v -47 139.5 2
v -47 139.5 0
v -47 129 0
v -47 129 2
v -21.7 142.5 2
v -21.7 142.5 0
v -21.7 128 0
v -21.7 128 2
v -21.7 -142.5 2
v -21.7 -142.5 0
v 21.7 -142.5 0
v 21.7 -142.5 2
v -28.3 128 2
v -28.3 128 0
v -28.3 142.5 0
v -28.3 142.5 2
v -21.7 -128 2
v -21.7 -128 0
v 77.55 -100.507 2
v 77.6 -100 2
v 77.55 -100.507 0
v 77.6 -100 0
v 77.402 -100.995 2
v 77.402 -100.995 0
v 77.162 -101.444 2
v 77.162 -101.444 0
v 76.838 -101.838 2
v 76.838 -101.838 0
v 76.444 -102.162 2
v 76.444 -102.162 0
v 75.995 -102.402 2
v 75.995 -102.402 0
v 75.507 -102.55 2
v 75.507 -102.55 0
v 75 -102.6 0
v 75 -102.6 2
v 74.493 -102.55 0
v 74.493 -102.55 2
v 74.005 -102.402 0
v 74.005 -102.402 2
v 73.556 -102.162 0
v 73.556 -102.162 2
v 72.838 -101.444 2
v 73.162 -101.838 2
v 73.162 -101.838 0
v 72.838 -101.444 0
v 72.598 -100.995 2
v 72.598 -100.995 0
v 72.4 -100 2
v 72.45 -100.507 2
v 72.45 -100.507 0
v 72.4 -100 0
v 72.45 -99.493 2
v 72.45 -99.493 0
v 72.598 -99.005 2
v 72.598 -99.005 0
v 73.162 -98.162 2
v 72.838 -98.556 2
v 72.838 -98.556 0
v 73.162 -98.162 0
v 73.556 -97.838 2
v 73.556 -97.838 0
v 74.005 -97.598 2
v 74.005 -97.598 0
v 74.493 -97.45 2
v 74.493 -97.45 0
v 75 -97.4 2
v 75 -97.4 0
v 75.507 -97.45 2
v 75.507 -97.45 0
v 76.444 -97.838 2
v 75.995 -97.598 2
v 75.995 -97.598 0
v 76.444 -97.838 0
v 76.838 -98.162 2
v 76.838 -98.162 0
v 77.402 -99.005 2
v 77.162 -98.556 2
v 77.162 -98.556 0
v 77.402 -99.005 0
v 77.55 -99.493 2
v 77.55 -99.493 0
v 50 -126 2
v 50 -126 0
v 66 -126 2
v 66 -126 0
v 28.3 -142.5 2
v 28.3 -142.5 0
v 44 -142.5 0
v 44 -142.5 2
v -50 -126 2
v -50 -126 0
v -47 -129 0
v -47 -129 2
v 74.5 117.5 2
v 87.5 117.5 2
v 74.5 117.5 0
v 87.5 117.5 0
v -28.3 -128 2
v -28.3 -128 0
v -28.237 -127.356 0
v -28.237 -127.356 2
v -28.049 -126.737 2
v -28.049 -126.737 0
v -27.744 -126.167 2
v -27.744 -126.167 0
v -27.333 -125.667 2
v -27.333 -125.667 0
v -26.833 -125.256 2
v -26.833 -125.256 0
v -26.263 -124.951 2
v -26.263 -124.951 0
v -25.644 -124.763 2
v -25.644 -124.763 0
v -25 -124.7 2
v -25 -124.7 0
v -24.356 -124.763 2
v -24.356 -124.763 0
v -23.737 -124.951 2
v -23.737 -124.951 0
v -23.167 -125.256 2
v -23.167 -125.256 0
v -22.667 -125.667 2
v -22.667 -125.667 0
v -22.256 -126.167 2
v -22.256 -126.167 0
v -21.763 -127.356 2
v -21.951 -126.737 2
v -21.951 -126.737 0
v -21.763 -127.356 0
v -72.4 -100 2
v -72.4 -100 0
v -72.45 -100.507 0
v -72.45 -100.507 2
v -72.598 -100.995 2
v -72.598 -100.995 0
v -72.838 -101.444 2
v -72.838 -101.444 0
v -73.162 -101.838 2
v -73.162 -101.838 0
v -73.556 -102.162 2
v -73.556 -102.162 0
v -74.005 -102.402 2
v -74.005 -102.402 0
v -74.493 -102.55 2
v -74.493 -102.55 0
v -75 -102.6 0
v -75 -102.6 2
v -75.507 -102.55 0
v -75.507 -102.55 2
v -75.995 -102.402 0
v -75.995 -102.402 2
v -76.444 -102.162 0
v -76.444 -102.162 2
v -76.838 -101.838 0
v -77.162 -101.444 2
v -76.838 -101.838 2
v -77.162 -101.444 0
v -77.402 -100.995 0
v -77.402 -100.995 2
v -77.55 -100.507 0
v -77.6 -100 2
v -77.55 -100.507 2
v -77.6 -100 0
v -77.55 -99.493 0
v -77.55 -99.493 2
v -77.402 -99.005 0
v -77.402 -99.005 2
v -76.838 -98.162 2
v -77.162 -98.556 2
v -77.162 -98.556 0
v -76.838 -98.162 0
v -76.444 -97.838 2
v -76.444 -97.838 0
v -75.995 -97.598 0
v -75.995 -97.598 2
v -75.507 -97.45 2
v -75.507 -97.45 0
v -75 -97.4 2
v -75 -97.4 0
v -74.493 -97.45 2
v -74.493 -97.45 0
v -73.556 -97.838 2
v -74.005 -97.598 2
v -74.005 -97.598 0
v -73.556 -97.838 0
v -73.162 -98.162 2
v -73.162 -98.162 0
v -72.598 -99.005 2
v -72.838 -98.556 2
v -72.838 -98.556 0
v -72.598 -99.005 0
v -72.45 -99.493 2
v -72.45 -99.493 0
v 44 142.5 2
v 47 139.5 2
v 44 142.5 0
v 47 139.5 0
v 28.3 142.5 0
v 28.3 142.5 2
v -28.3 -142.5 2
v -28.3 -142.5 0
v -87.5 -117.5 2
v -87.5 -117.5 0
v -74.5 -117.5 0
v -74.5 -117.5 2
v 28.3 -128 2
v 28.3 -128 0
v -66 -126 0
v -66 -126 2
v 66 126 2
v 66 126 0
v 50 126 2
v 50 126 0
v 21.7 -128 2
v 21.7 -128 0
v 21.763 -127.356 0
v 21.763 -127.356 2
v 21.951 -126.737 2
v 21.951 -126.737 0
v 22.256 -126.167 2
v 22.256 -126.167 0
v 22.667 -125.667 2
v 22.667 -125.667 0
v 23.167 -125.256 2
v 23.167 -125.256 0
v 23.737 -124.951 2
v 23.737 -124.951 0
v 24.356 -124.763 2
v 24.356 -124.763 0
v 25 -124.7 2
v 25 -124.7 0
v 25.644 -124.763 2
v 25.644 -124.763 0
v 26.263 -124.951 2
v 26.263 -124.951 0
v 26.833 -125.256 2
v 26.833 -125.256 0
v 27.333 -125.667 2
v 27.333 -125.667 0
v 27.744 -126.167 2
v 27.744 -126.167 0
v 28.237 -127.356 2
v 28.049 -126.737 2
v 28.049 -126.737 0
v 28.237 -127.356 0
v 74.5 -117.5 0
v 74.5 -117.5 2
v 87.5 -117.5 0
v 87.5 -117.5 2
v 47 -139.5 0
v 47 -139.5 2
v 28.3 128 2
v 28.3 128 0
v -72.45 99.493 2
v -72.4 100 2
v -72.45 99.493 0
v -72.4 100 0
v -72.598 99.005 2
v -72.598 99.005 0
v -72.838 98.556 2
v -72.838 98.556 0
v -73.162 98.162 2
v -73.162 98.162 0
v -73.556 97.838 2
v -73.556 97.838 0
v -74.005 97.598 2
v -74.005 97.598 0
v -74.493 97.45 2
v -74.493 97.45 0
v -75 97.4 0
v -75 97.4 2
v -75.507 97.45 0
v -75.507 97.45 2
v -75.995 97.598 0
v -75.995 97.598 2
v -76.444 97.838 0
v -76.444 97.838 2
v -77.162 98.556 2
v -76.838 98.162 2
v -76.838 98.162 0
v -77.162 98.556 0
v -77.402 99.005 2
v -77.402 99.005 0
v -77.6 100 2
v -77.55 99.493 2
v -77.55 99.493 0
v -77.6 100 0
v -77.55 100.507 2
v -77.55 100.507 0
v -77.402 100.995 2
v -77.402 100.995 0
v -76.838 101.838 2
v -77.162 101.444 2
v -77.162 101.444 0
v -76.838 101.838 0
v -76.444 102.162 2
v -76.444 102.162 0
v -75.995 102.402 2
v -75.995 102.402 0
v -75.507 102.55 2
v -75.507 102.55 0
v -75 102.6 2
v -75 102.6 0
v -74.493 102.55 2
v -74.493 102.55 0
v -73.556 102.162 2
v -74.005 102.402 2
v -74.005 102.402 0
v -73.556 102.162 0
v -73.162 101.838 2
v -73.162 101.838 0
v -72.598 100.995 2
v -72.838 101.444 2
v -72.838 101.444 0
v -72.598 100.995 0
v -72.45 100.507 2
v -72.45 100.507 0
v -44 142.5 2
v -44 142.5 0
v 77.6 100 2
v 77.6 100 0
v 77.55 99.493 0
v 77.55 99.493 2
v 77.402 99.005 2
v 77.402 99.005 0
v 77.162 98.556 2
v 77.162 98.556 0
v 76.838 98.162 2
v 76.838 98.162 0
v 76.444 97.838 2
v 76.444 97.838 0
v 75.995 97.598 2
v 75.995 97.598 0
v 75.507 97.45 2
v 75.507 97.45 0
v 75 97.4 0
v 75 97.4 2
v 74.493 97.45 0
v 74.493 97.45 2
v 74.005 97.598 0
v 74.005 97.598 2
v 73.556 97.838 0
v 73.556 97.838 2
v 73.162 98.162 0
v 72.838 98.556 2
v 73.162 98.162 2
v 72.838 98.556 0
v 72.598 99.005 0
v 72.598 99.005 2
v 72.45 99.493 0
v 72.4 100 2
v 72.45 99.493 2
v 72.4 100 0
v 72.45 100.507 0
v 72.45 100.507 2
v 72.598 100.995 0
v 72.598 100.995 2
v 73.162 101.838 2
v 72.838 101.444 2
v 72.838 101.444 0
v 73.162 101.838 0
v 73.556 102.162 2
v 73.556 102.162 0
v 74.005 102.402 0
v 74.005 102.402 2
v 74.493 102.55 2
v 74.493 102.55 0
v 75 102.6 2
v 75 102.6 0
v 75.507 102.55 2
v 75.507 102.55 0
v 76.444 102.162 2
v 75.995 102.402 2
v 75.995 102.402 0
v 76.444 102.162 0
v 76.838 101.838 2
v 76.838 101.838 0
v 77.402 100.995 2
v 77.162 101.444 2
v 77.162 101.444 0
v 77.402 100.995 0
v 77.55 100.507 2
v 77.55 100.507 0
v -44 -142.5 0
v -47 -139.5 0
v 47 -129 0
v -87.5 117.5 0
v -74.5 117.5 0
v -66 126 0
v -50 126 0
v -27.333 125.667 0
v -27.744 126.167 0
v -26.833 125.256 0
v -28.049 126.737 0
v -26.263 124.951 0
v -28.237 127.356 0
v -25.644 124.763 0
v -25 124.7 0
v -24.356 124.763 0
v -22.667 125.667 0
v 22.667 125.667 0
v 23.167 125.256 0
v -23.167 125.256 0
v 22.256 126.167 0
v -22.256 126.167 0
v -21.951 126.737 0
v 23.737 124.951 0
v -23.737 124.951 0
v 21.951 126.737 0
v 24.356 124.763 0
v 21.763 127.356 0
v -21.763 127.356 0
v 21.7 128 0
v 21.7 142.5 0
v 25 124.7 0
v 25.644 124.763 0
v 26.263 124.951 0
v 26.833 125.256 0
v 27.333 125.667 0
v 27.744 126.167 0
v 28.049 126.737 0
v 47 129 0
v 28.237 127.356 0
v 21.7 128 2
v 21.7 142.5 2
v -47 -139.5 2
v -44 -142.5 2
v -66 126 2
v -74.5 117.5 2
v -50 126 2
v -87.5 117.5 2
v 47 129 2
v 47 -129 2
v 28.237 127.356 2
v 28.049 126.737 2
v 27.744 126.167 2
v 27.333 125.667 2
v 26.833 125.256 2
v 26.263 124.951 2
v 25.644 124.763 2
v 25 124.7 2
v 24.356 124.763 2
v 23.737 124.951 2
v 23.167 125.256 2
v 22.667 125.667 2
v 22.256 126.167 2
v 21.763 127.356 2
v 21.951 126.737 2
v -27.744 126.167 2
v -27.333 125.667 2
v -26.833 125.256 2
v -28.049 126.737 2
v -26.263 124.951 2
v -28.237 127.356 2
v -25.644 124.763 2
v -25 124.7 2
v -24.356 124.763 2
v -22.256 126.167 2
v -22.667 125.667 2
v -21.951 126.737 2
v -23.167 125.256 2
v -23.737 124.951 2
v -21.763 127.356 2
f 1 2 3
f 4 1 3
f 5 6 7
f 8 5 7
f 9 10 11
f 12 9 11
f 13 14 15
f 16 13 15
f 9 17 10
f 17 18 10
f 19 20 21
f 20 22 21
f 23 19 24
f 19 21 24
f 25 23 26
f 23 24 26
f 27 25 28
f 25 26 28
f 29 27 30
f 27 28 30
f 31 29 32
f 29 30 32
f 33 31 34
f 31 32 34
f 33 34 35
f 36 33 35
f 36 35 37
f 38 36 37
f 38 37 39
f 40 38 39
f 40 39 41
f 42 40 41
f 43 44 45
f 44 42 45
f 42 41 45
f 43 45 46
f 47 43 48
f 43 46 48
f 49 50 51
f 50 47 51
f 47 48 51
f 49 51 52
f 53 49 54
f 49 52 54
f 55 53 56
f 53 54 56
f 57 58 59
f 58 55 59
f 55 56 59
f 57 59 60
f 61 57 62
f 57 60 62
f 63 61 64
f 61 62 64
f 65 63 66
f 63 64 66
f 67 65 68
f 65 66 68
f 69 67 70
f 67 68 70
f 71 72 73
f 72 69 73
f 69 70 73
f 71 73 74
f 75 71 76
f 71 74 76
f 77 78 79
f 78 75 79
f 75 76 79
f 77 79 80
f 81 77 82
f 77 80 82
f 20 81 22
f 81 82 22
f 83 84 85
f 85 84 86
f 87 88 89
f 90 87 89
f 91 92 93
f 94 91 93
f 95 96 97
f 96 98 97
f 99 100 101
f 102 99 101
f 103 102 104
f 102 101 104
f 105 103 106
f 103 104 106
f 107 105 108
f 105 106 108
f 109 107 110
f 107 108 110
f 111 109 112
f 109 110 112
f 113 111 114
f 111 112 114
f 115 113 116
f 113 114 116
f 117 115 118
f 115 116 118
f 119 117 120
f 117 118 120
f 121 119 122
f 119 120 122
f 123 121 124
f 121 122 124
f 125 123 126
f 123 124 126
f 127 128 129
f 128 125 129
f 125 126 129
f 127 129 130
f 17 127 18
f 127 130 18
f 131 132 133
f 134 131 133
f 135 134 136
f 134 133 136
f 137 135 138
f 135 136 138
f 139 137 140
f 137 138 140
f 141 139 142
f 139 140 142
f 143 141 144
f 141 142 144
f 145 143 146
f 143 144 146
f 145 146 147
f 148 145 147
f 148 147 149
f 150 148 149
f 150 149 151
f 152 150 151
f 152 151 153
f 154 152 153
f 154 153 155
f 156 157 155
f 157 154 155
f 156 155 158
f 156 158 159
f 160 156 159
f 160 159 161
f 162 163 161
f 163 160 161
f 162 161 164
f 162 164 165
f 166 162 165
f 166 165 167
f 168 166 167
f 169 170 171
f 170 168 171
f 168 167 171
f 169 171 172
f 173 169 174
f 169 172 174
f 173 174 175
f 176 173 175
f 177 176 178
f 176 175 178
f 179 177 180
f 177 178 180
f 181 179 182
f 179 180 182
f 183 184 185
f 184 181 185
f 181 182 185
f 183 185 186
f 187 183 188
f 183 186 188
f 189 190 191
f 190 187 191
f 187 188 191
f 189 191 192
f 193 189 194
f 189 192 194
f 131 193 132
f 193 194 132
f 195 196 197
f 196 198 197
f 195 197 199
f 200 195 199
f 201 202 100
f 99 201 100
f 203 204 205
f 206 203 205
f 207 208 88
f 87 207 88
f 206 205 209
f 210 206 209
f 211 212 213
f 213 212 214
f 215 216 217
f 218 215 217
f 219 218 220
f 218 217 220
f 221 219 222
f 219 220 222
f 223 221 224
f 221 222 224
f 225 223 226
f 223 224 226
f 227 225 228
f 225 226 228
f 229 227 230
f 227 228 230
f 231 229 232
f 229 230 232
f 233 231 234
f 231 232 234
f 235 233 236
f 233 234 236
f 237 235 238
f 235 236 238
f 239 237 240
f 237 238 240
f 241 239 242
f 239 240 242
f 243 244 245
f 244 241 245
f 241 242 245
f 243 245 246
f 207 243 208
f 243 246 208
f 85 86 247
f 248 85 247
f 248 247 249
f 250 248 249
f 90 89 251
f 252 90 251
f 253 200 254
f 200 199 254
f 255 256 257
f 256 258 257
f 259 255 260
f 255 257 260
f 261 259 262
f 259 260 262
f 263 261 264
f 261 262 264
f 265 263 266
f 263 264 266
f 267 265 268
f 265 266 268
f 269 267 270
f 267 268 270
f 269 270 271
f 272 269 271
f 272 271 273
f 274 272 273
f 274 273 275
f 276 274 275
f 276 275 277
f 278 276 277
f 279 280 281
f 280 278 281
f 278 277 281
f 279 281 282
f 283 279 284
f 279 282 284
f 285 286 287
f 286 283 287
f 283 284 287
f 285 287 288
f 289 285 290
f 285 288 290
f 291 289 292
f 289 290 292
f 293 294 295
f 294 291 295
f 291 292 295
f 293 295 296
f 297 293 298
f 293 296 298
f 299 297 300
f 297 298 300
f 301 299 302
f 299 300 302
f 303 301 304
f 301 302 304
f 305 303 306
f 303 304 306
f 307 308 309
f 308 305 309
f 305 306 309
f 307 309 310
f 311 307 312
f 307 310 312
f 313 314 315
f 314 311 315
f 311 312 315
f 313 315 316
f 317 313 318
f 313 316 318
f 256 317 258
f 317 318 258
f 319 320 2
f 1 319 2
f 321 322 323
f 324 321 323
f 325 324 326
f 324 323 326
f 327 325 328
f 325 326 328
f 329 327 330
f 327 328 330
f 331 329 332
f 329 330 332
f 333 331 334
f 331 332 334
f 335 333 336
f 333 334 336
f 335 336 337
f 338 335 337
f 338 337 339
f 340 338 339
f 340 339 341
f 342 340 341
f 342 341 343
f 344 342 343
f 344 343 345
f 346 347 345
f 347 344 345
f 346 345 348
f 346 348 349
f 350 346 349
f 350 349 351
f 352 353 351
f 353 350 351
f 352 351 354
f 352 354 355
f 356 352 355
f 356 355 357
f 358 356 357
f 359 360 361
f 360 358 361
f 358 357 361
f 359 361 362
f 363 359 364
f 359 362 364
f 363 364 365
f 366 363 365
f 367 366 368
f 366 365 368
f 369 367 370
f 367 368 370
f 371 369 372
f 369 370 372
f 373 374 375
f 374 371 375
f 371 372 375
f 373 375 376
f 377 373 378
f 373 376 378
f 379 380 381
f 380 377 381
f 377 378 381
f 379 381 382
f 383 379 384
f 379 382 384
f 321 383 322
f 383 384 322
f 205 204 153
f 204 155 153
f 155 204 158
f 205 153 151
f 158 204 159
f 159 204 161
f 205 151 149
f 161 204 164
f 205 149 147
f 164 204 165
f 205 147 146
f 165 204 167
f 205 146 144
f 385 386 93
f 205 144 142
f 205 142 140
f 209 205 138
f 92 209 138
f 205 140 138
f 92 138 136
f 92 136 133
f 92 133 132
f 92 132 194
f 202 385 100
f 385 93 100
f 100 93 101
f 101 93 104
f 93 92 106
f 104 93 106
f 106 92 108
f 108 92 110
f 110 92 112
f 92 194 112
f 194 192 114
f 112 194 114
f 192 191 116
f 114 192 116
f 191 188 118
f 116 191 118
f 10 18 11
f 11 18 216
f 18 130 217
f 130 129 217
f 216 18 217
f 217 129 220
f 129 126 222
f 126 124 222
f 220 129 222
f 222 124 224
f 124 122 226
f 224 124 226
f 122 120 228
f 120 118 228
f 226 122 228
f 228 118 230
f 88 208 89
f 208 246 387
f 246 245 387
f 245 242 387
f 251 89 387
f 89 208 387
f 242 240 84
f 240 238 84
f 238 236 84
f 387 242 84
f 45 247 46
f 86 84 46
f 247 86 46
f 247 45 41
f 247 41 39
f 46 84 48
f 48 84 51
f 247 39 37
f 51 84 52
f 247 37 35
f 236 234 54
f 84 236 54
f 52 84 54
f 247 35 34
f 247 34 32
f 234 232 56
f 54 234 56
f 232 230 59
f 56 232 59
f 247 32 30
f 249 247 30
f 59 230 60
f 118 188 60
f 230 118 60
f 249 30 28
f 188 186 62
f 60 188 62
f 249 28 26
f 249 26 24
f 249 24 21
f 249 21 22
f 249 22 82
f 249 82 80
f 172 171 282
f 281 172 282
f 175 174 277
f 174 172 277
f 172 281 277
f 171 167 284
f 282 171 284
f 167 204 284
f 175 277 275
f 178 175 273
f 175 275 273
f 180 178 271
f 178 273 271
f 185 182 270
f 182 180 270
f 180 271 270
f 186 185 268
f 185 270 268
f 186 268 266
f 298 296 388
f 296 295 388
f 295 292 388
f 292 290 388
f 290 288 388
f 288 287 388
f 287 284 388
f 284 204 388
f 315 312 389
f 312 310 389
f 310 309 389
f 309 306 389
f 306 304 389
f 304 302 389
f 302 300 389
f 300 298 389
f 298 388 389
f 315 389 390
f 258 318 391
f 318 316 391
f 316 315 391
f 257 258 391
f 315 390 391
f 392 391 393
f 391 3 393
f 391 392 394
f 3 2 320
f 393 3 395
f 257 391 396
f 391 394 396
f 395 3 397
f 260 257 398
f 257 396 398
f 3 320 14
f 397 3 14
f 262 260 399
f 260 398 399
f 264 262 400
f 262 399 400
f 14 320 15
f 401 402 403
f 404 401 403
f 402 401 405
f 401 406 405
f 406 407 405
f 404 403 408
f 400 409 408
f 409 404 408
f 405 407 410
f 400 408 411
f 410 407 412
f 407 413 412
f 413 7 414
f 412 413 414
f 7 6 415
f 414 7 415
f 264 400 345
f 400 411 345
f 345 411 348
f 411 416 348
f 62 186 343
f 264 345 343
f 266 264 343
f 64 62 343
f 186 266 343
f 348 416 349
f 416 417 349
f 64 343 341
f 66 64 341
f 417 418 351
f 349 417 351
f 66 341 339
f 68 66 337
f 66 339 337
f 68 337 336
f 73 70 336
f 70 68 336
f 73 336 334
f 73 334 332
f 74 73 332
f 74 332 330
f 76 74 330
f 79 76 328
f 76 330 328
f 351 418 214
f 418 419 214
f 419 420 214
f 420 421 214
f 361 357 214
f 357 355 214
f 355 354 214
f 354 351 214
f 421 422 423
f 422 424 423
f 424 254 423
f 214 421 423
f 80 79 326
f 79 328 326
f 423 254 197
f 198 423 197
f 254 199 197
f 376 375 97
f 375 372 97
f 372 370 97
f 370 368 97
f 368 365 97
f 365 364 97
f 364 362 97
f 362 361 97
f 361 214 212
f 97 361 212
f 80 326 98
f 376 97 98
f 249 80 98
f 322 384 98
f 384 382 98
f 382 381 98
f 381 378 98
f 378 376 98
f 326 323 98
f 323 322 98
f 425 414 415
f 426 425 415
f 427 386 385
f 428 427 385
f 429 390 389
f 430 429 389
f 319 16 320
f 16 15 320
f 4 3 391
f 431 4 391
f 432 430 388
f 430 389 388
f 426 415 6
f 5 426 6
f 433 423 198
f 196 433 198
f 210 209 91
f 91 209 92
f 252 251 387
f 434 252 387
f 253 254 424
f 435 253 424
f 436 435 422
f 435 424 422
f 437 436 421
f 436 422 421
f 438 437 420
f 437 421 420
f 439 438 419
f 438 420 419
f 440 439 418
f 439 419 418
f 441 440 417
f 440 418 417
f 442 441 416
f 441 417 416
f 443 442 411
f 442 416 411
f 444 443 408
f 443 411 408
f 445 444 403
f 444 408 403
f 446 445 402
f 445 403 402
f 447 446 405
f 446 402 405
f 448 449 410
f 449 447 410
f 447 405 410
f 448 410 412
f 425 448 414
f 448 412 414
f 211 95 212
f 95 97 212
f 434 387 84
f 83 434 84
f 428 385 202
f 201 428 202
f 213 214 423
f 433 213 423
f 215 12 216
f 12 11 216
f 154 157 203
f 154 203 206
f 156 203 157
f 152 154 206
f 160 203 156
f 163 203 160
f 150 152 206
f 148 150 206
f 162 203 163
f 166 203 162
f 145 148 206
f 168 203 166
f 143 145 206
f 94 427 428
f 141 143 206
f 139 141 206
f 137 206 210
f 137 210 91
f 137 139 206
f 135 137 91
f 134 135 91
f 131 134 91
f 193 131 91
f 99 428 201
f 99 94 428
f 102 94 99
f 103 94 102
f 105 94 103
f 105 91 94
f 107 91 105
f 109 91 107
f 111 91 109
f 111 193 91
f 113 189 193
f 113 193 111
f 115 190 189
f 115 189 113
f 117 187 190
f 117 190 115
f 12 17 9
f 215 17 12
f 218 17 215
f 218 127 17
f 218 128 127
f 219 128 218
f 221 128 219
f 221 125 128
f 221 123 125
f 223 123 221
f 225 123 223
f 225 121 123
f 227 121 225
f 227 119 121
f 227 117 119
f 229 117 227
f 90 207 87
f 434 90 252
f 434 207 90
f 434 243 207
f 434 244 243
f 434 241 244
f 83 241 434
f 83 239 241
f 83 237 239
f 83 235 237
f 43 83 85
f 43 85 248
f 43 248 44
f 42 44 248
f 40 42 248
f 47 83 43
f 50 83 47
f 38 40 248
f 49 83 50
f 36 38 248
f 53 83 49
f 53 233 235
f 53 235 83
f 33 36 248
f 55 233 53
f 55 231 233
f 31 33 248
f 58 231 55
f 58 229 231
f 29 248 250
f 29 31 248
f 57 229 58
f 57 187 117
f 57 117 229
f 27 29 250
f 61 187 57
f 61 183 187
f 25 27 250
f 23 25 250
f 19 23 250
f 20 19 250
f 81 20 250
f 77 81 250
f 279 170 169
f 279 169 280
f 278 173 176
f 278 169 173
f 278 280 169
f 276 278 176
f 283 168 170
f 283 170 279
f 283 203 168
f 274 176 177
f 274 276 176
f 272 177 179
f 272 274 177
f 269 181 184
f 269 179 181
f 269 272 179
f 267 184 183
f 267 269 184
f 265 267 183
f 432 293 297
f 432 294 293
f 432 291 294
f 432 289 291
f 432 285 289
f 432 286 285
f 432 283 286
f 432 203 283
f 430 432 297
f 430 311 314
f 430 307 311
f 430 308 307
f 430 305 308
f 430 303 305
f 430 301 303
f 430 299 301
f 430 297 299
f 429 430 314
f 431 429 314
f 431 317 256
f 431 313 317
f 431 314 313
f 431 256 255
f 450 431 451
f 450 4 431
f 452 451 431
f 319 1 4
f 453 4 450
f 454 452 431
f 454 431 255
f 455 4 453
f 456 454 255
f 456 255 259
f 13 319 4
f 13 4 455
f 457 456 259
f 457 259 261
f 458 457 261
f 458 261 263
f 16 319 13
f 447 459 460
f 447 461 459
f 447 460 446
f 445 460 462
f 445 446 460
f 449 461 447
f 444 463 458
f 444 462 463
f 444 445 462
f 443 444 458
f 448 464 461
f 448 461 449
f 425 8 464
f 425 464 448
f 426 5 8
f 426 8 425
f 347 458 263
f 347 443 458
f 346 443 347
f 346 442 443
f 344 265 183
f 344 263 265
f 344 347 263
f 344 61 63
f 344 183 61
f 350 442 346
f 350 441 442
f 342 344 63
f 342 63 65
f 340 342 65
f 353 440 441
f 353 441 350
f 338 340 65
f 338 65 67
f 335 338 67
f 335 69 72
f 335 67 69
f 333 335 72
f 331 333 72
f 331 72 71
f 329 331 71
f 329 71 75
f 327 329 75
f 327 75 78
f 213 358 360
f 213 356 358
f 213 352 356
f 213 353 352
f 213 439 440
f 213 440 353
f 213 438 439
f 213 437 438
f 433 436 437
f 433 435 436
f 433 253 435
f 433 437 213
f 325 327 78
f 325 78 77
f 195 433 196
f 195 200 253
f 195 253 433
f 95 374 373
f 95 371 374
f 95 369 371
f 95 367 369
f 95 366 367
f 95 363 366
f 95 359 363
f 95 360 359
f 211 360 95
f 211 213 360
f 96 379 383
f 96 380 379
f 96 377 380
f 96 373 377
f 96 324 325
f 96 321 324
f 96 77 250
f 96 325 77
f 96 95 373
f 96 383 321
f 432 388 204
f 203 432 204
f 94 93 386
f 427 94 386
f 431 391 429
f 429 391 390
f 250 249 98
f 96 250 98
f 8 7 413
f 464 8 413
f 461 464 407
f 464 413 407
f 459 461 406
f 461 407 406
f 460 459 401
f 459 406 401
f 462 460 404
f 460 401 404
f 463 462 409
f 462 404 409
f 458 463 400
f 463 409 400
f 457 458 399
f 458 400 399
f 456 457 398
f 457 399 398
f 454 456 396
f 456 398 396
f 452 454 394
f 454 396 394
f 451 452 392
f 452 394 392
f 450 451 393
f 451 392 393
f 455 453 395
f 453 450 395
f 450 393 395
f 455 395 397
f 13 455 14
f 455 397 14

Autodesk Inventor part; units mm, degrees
sketch "Sketch_7" plane through (0, 0, 0) normal (0, 0, 1) x (1, 0, 0)
  line L0 (-87.5, 117.5) -> (-87.5, -117.5)
  line L1 (-87.5, -117.5) -> (-74.5, -117.5)
  line L2 (-74.5, -117.5) -> (-66, -126)
  line L3 (-66, -126) -> (-50, -126)
  line L4 (-50, -126) -> (-47, -129)
  line L5 (-47, -129) -> (-47, -139.5)
  line L6 (-47, -139.5) -> (-44, -142.5)
  line L7 (-44, -142.5) -> (-28.3, -142.5)
  line L8 (-28.3, -142.5) -> (-28.3, -128)
  arc A0 (-21.7, -128) -> (-28.3, -128) centre (-25, -128) ccw
  line L9 (-21.7, -128) -> (-21.7, -142.5)
  line L10 (-21.7, -142.5) -> (21.7, -142.5)
  line L11 (21.7, -142.5) -> (21.7, -128)
  arc A1 (28.3, -128) -> (21.7, -128) centre (25, -128) ccw
  line L12 (28.3, -128) -> (28.3, -142.5)
  line L13 (28.3, -142.5) -> (44, -142.5)
  line L14 (44, -142.5) -> (47, -139.5)
  line L15 (47, -139.5) -> (47, -129)
  line L16 (47, -129) -> (50, -126)
  line L17 (50, -126) -> (66, -126)
  line L18 (66, -126) -> (74.5, -117.5)
  line L19 (74.5, -117.5) -> (87.5, -117.5)
  line L20 (87.5, -117.5) -> (87.5, 117.5)
  line L21 (87.5, 117.5) -> (74.5, 117.5)
  line L22 (74.5, 117.5) -> (66, 126)
  line L23 (66, 126) -> (50, 126)
  line L24 (50, 126) -> (47, 129)
  line L25 (47, 129) -> (47, 139.5)
  line L26 (47, 139.5) -> (44, 142.5)
  line L27 (44, 142.5) -> (28.3, 142.5)
  line L28 (28.3, 142.5) -> (28.3, 128)
  arc A2 (21.7, 128) -> (28.3, 128) centre (25, 128) ccw
  line L29 (21.7, 128) -> (21.7, 142.5)
  line L30 (21.7, 142.5) -> (-21.7, 142.5)
  line L31 (-21.7, 142.5) -> (-21.7, 128)
  arc A3 (-28.3, 128) -> (-21.7, 128) centre (-25, 128) ccw
  line L32 (-28.3, 128) -> (-28.3, 142.5)
  line L33 (-28.3, 142.5) -> (-44, 142.5)
  line L34 (-44, 142.5) -> (-47, 139.5)
  line L35 (-47, 139.5) -> (-47, 129)
  line L36 (-47, 129) -> (-50, 126)
  line L37 (-50, 126) -> (-66, 126)
  line L38 (-66, 126) -> (-74.5, 117.5)
  line L39 (-74.5, 117.5) -> (-87.5, 117.5)
  circle A4 centre (75, 100) radius 2.6
  circle A5 centre (75, -100) radius 2.6
  circle A6 centre (-75, 100) radius 2.6
  circle A7 centre (-75, -100) radius 2.6
extrude "Extrusion1" add sketch "Sketch_7" along normal blind 2
ref_plane "MONTAGEPLATTE_XY" through (0, 0, 0) normal (0, 0, 1) x (1, 0, 0)
ref_plane "MONTAGEPLATTE_YZ" through (0, 0, 0) normal (1, 0, 0) x (0, 1, 0)
ref_plane "MONTAGEPLATTE_ZX" through (0, 0, 0) normal (0, 1, 0) x (0, 0, 1)
properties part number "1301.000_6_(1)"
